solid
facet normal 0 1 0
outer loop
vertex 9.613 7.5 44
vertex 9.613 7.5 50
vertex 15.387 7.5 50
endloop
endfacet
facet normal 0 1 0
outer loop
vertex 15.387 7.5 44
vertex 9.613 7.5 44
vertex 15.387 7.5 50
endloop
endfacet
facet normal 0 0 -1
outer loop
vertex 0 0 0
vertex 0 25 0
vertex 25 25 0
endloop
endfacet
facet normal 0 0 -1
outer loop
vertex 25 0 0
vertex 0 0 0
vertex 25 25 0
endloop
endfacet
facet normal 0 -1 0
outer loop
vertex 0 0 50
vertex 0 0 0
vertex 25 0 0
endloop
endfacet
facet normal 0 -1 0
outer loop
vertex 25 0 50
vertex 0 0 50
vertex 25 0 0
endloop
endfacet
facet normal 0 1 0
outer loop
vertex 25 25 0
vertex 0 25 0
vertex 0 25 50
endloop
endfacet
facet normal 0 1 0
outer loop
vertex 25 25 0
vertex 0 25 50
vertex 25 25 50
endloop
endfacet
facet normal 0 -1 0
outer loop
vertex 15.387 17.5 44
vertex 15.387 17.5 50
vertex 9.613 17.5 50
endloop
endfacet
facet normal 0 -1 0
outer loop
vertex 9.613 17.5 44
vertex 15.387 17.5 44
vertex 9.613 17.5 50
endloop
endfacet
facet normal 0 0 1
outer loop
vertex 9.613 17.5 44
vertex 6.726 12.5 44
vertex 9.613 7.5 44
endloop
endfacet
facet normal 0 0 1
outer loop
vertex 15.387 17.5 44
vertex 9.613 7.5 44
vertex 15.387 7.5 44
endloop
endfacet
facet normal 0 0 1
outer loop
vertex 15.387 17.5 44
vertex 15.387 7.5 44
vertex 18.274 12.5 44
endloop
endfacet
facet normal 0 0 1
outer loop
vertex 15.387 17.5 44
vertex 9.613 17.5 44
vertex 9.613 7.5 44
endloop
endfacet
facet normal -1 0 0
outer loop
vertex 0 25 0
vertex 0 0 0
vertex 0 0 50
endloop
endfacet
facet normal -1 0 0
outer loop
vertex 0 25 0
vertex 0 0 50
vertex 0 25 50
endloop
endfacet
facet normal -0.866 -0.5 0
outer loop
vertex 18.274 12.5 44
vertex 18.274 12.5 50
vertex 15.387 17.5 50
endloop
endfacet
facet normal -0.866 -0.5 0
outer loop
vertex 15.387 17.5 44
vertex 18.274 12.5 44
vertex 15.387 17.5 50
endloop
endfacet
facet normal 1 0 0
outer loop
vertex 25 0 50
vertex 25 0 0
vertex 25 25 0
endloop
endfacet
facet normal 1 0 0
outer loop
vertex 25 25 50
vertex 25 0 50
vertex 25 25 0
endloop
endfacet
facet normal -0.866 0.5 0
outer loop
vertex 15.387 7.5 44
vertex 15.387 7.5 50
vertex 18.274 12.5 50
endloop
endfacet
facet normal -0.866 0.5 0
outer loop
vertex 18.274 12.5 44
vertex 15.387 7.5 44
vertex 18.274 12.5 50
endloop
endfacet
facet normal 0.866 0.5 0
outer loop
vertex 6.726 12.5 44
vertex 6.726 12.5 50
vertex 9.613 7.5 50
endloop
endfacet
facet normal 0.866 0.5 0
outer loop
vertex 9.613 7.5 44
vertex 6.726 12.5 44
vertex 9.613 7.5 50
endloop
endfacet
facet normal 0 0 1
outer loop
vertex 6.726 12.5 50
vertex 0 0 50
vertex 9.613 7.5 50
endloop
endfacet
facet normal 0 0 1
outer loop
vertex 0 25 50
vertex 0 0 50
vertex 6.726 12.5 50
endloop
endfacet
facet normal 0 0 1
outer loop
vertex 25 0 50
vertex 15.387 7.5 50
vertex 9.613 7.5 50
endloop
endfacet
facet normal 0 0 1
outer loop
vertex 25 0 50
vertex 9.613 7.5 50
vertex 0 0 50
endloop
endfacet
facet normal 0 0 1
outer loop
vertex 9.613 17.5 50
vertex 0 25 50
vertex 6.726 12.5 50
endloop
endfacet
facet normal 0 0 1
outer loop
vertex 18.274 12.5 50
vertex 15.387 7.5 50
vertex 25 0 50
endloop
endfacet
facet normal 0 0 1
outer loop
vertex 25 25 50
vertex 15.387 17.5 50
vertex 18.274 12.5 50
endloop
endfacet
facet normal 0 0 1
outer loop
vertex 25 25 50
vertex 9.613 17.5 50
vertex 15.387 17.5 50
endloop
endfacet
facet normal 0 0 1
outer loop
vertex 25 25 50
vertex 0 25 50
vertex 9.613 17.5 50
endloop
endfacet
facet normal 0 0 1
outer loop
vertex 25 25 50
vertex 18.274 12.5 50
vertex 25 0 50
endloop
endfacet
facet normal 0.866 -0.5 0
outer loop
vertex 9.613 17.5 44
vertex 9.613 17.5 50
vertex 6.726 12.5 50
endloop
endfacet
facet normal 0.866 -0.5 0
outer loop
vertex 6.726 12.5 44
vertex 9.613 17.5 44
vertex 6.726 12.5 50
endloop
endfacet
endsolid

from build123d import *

# Parameters (mm, degrees)
CROQUIS1_W              = 25
CROQUIS1_H              = 25
SALIENTE_EXTRUIR1_DEPTH = 50
CORTAR_EXTRUIR1_DEPTH   = 6


with BuildPart() as part:
    # Croquis1 → Saliente-Extruir1 (new body)
    with BuildSketch(Plane.XY):
        with Locations((12.5, 12.5)):
            Rectangle(CROQUIS1_W, CROQUIS1_H)
    extrude(amount=SALIENTE_EXTRUIR1_DEPTH)

    # Croquis2 → Cortar-Extruir1 (cut)
    with BuildSketch(Plane.XY.offset(50)):
        Polygon((18.273502692, 12.5), (15.386751346, 17.5), (9.613248654, 17.5), (6.726497308, 12.5), (9.613248654, 7.5), (15.386751346, 7.5), align=None)
    extrude(amount=-CORTAR_EXTRUIR1_DEPTH, mode=Mode.SUBTRACT)


solid = part.part
